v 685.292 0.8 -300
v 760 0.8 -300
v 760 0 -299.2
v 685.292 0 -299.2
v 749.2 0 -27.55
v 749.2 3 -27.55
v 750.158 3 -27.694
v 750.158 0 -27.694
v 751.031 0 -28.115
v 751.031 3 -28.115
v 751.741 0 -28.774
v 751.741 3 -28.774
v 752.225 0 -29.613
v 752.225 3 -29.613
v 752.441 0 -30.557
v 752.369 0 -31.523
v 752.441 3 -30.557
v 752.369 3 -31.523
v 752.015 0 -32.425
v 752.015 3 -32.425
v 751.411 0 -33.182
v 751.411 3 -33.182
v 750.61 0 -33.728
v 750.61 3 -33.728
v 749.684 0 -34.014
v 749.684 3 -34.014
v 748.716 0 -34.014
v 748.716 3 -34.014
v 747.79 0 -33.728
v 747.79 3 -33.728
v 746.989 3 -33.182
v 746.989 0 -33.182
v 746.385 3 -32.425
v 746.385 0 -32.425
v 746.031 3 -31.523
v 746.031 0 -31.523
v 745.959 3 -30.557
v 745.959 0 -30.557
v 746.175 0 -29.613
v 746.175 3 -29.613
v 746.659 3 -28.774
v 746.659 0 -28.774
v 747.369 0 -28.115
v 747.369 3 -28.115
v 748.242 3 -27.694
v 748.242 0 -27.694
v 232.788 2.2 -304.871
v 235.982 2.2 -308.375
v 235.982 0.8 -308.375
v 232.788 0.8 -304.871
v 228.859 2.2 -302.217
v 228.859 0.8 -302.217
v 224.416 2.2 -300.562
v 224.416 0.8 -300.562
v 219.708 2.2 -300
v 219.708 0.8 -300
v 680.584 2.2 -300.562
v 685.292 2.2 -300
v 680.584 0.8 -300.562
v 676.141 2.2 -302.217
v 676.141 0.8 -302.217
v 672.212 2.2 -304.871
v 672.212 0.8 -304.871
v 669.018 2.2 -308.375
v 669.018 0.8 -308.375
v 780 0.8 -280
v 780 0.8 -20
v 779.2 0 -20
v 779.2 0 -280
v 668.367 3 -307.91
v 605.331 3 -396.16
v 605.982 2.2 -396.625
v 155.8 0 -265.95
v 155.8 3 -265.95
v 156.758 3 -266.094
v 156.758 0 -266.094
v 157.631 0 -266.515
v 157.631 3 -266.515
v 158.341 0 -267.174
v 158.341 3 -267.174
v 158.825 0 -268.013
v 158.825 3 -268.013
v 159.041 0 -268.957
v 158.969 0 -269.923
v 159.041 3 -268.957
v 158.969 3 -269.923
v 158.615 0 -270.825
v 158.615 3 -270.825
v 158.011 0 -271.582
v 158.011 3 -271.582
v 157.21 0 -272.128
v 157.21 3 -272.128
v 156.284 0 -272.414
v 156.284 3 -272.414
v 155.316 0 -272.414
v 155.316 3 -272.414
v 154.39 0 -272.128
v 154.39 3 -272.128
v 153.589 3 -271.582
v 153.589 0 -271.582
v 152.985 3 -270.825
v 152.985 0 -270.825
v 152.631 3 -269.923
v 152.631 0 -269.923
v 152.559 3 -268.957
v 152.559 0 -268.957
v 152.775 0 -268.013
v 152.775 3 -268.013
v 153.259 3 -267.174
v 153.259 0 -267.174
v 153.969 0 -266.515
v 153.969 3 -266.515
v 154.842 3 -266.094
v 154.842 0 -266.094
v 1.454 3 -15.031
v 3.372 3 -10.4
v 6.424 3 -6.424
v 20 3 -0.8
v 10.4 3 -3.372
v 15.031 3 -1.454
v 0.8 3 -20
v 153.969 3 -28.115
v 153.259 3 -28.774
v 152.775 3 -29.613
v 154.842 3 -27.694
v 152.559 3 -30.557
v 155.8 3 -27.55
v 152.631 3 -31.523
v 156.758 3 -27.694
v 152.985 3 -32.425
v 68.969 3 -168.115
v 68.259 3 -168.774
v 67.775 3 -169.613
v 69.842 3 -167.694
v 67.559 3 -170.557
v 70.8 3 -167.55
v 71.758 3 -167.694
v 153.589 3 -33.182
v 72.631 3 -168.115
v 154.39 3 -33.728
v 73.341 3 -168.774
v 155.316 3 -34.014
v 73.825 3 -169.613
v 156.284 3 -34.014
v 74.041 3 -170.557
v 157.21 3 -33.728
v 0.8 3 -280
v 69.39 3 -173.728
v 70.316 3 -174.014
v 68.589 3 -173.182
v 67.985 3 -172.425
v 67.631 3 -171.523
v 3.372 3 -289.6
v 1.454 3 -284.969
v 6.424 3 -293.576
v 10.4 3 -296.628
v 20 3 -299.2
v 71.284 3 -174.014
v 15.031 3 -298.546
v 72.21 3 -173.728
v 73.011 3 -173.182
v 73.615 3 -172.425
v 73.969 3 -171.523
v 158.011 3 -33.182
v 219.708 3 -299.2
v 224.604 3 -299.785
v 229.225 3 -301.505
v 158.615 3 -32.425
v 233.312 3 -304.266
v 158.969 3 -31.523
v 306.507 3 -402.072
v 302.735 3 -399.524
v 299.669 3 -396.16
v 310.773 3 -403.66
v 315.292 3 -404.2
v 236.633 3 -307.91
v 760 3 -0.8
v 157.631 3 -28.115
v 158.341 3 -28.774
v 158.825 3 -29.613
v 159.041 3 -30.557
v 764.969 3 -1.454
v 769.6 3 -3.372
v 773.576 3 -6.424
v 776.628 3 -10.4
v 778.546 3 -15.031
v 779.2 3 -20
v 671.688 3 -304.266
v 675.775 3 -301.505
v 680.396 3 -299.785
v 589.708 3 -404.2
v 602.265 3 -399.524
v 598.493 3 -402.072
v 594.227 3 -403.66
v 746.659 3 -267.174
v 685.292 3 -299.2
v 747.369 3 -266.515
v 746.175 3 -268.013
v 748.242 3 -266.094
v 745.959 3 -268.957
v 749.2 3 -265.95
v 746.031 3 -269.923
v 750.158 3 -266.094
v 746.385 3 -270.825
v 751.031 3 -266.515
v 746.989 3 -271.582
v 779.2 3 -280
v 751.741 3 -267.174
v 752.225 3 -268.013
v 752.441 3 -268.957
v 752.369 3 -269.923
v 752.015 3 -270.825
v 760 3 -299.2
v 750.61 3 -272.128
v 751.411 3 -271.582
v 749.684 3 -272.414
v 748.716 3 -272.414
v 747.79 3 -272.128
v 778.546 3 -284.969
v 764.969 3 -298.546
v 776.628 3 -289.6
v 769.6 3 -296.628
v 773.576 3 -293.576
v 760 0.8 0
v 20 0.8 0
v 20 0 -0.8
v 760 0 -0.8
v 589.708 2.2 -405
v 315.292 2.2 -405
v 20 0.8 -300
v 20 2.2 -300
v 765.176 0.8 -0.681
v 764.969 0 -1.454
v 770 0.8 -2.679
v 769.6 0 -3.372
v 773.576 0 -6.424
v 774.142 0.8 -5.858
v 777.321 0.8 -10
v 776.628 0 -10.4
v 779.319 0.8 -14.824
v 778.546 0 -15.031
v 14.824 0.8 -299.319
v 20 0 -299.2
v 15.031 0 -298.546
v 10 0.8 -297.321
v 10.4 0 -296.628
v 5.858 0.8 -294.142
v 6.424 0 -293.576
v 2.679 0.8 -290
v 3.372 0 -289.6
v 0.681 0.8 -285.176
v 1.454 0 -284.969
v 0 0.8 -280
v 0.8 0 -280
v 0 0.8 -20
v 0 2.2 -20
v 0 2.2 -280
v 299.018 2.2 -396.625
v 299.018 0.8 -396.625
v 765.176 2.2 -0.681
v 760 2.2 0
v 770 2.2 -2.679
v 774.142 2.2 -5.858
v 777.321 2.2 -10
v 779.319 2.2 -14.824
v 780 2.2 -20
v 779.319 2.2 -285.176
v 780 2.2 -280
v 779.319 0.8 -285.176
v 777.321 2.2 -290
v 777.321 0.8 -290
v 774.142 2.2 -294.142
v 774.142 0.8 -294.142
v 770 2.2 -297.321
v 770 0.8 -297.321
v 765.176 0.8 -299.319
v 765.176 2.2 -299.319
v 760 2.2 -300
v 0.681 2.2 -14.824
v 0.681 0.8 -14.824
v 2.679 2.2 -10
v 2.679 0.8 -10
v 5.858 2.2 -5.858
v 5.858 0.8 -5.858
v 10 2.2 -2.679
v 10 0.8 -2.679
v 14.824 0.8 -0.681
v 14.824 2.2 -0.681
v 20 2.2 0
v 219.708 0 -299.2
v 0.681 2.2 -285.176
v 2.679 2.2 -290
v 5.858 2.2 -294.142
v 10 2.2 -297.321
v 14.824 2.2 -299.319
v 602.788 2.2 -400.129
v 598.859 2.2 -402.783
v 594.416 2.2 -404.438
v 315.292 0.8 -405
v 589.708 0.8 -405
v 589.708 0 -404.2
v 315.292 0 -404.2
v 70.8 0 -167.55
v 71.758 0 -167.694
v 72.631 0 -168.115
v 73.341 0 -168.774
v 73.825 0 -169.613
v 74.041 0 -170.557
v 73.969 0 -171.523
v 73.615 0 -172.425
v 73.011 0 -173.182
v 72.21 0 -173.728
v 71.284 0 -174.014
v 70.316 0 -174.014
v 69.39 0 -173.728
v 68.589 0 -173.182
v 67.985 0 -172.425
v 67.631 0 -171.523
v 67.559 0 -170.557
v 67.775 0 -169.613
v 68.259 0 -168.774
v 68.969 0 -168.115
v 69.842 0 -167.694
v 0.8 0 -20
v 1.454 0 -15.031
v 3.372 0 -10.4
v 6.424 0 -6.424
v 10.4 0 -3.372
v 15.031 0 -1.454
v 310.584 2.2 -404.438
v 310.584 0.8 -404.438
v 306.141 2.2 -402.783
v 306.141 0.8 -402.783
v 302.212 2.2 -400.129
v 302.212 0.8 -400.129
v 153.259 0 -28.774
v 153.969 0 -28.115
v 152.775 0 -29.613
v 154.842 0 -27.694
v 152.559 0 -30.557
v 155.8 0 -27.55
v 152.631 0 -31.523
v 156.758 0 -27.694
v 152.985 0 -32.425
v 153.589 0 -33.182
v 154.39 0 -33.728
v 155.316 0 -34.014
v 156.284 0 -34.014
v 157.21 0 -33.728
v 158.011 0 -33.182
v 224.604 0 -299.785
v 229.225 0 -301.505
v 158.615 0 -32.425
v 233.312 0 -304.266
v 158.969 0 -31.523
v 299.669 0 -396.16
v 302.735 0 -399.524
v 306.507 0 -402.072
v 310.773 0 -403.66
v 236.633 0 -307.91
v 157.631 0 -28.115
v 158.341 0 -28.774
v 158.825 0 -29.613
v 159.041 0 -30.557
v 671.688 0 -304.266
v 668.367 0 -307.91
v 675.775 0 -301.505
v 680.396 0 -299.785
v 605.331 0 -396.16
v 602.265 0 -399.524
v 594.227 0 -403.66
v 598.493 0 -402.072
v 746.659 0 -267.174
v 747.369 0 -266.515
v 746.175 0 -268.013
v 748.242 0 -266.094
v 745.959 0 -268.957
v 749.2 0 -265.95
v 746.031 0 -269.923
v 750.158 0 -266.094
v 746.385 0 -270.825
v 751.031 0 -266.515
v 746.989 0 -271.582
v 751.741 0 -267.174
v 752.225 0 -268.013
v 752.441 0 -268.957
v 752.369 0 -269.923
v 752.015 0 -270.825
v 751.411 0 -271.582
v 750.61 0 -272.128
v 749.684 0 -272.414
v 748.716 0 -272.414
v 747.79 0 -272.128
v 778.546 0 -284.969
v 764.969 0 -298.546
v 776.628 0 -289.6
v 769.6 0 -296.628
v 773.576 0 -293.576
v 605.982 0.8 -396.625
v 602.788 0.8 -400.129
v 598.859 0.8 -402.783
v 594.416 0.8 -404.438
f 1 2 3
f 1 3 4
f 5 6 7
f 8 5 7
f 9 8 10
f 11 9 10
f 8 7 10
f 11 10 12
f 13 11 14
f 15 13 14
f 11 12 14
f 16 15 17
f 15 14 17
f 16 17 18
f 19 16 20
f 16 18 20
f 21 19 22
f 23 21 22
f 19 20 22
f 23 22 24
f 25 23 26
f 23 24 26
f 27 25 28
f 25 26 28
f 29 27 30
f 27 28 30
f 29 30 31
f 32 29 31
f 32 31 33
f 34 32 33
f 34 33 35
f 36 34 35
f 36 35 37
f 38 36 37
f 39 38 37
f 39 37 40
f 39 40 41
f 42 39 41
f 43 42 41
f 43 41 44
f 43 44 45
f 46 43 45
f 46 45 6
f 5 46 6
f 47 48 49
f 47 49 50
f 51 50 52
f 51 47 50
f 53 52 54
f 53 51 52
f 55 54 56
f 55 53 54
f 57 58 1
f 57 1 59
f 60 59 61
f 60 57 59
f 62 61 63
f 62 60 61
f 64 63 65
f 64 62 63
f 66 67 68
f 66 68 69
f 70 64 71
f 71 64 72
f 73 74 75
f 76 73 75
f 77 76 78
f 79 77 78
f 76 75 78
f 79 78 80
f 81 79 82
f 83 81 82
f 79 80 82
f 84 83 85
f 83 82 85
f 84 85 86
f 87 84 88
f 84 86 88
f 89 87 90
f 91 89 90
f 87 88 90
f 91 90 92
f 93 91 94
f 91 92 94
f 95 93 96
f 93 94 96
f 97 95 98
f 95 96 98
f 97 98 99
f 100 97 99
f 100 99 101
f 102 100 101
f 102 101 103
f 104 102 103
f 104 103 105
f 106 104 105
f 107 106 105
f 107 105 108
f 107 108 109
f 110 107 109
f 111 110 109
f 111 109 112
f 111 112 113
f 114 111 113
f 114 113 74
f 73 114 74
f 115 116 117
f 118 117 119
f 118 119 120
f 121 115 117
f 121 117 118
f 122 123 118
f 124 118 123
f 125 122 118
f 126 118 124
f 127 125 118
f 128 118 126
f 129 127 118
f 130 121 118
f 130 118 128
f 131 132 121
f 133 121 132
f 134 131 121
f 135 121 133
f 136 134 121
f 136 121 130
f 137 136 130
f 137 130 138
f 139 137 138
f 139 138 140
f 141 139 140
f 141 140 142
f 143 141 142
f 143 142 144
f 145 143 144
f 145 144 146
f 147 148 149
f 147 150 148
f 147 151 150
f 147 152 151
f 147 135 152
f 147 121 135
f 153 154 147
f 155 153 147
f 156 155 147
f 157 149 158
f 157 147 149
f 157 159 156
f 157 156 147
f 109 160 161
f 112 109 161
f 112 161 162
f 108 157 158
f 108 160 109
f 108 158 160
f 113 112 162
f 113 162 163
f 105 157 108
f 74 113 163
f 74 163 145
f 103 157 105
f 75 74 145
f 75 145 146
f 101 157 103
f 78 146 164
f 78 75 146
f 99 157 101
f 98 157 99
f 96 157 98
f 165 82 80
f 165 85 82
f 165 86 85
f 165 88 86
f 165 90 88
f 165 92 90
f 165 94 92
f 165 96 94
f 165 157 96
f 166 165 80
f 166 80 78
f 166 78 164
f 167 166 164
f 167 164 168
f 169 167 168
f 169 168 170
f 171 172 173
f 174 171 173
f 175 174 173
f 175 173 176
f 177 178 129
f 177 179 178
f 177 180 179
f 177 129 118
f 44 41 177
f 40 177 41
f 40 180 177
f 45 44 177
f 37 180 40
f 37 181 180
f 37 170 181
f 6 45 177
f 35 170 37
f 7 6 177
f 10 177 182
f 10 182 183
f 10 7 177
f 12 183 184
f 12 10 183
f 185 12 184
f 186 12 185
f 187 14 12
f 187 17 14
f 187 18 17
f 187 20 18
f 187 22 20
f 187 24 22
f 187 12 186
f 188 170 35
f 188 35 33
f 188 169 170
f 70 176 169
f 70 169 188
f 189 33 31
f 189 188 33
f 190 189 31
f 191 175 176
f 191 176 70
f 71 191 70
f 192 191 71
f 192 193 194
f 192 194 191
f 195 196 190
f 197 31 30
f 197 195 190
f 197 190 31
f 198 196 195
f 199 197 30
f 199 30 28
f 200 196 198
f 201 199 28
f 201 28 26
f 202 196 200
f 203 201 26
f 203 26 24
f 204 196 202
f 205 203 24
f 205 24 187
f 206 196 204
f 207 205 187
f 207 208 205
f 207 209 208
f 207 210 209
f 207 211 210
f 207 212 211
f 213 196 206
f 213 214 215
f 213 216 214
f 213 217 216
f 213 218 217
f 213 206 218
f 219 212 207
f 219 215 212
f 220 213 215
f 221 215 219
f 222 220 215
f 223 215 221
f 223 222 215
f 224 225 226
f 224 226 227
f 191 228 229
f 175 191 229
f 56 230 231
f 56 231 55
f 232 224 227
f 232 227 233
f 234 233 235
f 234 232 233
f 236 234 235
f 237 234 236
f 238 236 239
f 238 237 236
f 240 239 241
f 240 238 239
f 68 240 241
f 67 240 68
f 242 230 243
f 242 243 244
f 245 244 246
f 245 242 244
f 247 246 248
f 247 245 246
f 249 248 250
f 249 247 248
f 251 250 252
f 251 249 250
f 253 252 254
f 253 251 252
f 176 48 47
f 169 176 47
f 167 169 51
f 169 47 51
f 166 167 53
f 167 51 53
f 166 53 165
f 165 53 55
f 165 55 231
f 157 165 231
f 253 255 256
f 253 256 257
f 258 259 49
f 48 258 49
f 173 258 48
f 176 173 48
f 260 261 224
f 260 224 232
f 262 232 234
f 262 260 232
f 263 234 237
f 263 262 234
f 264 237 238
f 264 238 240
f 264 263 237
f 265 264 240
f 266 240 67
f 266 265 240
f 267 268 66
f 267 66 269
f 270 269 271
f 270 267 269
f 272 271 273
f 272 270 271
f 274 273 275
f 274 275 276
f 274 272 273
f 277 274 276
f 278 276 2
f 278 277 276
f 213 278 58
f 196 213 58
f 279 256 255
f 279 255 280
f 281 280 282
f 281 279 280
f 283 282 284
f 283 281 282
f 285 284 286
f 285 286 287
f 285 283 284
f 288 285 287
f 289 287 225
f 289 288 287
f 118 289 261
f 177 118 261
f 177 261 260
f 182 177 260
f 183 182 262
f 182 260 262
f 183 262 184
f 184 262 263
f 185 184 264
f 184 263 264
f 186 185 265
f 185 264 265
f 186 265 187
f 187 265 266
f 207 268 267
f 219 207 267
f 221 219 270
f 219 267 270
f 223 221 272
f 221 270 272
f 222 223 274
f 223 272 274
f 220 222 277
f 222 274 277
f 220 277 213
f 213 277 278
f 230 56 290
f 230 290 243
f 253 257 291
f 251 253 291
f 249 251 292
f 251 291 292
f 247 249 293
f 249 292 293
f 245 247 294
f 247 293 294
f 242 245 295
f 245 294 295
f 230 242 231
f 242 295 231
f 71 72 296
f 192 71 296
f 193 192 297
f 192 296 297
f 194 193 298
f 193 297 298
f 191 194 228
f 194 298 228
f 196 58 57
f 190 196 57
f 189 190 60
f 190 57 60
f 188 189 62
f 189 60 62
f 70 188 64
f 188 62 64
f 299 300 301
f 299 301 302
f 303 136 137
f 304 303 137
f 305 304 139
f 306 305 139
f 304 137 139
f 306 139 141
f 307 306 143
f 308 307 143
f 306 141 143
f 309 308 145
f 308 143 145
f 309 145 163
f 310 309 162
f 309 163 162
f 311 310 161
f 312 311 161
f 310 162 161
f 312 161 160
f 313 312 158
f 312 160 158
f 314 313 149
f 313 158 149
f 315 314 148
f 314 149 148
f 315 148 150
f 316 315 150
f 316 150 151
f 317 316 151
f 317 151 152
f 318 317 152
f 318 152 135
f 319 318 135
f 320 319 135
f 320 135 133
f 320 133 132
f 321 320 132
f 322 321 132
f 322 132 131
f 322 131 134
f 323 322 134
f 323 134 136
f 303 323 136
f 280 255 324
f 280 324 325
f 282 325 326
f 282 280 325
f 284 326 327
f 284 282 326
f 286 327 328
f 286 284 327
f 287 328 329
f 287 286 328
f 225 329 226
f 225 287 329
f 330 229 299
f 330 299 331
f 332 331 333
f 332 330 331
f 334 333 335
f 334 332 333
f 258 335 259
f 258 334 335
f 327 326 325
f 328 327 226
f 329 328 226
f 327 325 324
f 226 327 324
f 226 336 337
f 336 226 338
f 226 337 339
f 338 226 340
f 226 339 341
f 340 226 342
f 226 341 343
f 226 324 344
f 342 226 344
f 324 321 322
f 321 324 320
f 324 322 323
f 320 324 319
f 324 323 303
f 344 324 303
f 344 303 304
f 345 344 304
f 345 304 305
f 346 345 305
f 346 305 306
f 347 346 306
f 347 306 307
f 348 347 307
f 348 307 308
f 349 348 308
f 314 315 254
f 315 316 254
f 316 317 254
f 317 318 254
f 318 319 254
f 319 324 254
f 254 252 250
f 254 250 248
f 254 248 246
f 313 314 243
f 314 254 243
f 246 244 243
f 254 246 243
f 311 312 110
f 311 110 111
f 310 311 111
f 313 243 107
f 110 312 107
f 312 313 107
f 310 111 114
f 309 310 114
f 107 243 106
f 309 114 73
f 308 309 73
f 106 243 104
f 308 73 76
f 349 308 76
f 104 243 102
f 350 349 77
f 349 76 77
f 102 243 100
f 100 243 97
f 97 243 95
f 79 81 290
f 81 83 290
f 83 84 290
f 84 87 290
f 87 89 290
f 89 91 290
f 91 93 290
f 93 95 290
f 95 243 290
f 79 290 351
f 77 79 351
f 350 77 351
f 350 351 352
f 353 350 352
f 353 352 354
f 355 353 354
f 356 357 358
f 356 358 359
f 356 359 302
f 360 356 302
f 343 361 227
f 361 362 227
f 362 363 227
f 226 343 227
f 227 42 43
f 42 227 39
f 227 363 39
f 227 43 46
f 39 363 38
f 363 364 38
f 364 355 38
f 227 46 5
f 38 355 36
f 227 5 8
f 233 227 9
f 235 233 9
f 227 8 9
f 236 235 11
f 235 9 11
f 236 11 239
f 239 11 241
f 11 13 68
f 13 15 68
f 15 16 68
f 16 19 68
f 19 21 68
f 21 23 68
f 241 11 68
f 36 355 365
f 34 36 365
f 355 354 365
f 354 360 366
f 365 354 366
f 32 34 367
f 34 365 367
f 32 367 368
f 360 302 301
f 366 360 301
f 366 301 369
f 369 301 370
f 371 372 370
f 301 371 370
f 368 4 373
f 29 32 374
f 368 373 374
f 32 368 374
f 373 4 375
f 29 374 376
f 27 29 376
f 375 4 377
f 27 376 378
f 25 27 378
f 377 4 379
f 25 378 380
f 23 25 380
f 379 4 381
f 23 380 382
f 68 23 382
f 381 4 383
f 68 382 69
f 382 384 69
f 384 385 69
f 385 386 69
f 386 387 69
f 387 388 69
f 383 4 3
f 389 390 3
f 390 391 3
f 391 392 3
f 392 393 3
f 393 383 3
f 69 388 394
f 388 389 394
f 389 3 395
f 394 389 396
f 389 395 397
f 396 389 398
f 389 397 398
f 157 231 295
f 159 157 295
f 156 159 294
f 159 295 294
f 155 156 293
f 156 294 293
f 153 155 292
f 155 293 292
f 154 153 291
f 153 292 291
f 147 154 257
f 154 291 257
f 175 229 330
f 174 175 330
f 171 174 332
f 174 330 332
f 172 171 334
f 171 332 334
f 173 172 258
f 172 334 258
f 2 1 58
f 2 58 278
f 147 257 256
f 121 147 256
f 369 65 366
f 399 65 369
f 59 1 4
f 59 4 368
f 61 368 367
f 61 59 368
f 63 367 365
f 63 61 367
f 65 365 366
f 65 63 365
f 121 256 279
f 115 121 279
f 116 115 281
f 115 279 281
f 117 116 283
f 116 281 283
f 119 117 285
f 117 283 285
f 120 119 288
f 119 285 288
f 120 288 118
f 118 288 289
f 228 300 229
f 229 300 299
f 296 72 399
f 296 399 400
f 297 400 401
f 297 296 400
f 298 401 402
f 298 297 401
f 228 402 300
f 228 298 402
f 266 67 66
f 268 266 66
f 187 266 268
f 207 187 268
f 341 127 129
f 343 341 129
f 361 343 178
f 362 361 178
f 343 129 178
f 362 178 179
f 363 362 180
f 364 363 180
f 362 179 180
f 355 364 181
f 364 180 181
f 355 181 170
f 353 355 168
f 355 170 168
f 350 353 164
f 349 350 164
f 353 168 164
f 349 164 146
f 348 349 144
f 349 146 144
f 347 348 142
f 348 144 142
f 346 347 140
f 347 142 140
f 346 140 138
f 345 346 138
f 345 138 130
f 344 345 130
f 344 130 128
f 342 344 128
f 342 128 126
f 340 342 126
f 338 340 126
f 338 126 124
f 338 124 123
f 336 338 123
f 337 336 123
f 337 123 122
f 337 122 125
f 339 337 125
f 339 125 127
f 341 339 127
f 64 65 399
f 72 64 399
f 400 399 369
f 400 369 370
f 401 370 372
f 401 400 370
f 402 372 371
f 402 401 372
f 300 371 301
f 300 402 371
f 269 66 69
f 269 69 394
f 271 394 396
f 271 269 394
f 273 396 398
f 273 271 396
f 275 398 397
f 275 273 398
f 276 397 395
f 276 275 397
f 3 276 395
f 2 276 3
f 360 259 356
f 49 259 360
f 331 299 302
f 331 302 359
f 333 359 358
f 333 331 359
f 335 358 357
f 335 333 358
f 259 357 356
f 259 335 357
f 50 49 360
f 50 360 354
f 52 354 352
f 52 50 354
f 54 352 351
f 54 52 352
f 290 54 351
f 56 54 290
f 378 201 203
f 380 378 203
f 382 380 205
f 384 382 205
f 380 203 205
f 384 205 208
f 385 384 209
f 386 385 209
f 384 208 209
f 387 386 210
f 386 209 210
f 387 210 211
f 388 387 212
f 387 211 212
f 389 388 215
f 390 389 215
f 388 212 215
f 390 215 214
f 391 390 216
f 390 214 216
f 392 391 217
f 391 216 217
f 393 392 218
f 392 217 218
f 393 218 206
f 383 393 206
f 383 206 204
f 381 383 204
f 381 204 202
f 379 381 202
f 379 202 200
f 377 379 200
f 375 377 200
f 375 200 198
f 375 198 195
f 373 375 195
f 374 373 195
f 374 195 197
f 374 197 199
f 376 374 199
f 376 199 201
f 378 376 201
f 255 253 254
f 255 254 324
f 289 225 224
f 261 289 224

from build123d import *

# Parameters (mm, degrees)
SKETCH_1_W          = 780
SKETCH_1_H          = 300
EXTRUDE_1_DEPTH     = 3
FILLET_3_R          = 20
CHAMFER_1_SIZE      = 0.8
SKETCH_2_R          = 3.25
CUT_EXTRUDE_1_DEPTH = 10


with BuildPart() as part:
    # 草图1 → 凸台-拉伸1 (new body)
    with BuildSketch(Plane(origin=(0, 0, 0), x_dir=(1, 0, 0), z_dir=(0, 1, 0))):
        with Locations((390, 150)):
            Rectangle(SKETCH_1_W, SKETCH_1_H)
        Polygon((600, 405), (305, 405), (230, 300), (305, 300), (600, 300), (675, 300), align=None)
    extrude(amount=EXTRUDE_1_DEPTH)

    # 圆角3
    fillet_3_edges = [part.edges().sort_by_distance(p)[0] for p in [
        (0, 1.5, 0),
        (0, 1.5, -300),
        (230, 1.5, -300),
        (305, 1.5, -405),
        (600, 1.5, -405),
        (675, 1.5, -300),
        (780, 1.5, -300),
        (780, 1.5, 0),
    ]]
    fillet(fillet_3_edges, radius=FILLET_3_R)

    # 倒角1
    chamfer_1_edges = [part.edges().sort_by_distance(p)[0] for p in [
        (390, 0, 0),
        (390, 3, 0),
        (0, 0, -150),
        (119.853821047, 0, -300),
        (267.5, 0, -352.5),
        (452.5, 0, -405),
        (637.5, 0, -352.5),
        (722.646178953, 0, -300),
        (780, 0, -150),
        (5.857864376, 0, -294.142135624),
        (774.142135624, 0, -5.857864376),
        (774.142135624, 0, -294.142135624),
        (598.859273711, 0, -402.783352854),
        (306.140726289, 0, -402.783352854),
        (5.857864376, 0, -5.857864376),
        (0, 3, -150),
        (780, 3, -150),
        (722.646178953, 3, -300),
        (637.5, 3, -352.5),
        (452.5, 3, -405),
        (267.5, 3, -352.5),
        (119.853821047, 3, -300),
        (5.857864376, 3, -294.142135624),
        (774.142135624, 3, -5.857864376),
        (774.142135624, 3, -294.142135624),
        (598.859273711, 3, -402.783352854),
        (306.140726289, 3, -402.783352854),
        (5.857864376, 3, -5.857864376),
        (228.859273711, 0, -302.216647146),
        (228.859273711, 3, -302.216647146),
        (676.140726289, 0, -302.216647146),
        (676.140726289, 3, -302.216647146),
    ]]
    chamfer(chamfer_1_edges, length=CHAMFER_1_SIZE)

    # 草图2 → 切除-拉伸1 (cut)
    with BuildSketch(Plane(origin=(0, 3, 0), x_dir=(1, 0, 0), z_dir=(0, 1, 0))):
        with Locations(Location((70.8, 170.8, 0), (0, 0, 270))):
            Circle(SKETCH_2_R)
        with Locations(Location((749.2, 269.2, 0), (0, 0, 270))):
            Circle(SKETCH_2_R)
        with Locations(Location((749.2, 30.8, 0), (0, 0, 270))):
            Circle(SKETCH_2_R)
        with Locations(Location((155.8, 30.8, 0), (0, 0, 270))):
            Circle(SKETCH_2_R)
        with Locations(Location((155.8, 269.2, 0), (0, 0, 270))):
            Circle(SKETCH_2_R)
    extrude(amount=-CUT_EXTRUDE_1_DEPTH, mode=Mode.SUBTRACT)


solid = part.part
